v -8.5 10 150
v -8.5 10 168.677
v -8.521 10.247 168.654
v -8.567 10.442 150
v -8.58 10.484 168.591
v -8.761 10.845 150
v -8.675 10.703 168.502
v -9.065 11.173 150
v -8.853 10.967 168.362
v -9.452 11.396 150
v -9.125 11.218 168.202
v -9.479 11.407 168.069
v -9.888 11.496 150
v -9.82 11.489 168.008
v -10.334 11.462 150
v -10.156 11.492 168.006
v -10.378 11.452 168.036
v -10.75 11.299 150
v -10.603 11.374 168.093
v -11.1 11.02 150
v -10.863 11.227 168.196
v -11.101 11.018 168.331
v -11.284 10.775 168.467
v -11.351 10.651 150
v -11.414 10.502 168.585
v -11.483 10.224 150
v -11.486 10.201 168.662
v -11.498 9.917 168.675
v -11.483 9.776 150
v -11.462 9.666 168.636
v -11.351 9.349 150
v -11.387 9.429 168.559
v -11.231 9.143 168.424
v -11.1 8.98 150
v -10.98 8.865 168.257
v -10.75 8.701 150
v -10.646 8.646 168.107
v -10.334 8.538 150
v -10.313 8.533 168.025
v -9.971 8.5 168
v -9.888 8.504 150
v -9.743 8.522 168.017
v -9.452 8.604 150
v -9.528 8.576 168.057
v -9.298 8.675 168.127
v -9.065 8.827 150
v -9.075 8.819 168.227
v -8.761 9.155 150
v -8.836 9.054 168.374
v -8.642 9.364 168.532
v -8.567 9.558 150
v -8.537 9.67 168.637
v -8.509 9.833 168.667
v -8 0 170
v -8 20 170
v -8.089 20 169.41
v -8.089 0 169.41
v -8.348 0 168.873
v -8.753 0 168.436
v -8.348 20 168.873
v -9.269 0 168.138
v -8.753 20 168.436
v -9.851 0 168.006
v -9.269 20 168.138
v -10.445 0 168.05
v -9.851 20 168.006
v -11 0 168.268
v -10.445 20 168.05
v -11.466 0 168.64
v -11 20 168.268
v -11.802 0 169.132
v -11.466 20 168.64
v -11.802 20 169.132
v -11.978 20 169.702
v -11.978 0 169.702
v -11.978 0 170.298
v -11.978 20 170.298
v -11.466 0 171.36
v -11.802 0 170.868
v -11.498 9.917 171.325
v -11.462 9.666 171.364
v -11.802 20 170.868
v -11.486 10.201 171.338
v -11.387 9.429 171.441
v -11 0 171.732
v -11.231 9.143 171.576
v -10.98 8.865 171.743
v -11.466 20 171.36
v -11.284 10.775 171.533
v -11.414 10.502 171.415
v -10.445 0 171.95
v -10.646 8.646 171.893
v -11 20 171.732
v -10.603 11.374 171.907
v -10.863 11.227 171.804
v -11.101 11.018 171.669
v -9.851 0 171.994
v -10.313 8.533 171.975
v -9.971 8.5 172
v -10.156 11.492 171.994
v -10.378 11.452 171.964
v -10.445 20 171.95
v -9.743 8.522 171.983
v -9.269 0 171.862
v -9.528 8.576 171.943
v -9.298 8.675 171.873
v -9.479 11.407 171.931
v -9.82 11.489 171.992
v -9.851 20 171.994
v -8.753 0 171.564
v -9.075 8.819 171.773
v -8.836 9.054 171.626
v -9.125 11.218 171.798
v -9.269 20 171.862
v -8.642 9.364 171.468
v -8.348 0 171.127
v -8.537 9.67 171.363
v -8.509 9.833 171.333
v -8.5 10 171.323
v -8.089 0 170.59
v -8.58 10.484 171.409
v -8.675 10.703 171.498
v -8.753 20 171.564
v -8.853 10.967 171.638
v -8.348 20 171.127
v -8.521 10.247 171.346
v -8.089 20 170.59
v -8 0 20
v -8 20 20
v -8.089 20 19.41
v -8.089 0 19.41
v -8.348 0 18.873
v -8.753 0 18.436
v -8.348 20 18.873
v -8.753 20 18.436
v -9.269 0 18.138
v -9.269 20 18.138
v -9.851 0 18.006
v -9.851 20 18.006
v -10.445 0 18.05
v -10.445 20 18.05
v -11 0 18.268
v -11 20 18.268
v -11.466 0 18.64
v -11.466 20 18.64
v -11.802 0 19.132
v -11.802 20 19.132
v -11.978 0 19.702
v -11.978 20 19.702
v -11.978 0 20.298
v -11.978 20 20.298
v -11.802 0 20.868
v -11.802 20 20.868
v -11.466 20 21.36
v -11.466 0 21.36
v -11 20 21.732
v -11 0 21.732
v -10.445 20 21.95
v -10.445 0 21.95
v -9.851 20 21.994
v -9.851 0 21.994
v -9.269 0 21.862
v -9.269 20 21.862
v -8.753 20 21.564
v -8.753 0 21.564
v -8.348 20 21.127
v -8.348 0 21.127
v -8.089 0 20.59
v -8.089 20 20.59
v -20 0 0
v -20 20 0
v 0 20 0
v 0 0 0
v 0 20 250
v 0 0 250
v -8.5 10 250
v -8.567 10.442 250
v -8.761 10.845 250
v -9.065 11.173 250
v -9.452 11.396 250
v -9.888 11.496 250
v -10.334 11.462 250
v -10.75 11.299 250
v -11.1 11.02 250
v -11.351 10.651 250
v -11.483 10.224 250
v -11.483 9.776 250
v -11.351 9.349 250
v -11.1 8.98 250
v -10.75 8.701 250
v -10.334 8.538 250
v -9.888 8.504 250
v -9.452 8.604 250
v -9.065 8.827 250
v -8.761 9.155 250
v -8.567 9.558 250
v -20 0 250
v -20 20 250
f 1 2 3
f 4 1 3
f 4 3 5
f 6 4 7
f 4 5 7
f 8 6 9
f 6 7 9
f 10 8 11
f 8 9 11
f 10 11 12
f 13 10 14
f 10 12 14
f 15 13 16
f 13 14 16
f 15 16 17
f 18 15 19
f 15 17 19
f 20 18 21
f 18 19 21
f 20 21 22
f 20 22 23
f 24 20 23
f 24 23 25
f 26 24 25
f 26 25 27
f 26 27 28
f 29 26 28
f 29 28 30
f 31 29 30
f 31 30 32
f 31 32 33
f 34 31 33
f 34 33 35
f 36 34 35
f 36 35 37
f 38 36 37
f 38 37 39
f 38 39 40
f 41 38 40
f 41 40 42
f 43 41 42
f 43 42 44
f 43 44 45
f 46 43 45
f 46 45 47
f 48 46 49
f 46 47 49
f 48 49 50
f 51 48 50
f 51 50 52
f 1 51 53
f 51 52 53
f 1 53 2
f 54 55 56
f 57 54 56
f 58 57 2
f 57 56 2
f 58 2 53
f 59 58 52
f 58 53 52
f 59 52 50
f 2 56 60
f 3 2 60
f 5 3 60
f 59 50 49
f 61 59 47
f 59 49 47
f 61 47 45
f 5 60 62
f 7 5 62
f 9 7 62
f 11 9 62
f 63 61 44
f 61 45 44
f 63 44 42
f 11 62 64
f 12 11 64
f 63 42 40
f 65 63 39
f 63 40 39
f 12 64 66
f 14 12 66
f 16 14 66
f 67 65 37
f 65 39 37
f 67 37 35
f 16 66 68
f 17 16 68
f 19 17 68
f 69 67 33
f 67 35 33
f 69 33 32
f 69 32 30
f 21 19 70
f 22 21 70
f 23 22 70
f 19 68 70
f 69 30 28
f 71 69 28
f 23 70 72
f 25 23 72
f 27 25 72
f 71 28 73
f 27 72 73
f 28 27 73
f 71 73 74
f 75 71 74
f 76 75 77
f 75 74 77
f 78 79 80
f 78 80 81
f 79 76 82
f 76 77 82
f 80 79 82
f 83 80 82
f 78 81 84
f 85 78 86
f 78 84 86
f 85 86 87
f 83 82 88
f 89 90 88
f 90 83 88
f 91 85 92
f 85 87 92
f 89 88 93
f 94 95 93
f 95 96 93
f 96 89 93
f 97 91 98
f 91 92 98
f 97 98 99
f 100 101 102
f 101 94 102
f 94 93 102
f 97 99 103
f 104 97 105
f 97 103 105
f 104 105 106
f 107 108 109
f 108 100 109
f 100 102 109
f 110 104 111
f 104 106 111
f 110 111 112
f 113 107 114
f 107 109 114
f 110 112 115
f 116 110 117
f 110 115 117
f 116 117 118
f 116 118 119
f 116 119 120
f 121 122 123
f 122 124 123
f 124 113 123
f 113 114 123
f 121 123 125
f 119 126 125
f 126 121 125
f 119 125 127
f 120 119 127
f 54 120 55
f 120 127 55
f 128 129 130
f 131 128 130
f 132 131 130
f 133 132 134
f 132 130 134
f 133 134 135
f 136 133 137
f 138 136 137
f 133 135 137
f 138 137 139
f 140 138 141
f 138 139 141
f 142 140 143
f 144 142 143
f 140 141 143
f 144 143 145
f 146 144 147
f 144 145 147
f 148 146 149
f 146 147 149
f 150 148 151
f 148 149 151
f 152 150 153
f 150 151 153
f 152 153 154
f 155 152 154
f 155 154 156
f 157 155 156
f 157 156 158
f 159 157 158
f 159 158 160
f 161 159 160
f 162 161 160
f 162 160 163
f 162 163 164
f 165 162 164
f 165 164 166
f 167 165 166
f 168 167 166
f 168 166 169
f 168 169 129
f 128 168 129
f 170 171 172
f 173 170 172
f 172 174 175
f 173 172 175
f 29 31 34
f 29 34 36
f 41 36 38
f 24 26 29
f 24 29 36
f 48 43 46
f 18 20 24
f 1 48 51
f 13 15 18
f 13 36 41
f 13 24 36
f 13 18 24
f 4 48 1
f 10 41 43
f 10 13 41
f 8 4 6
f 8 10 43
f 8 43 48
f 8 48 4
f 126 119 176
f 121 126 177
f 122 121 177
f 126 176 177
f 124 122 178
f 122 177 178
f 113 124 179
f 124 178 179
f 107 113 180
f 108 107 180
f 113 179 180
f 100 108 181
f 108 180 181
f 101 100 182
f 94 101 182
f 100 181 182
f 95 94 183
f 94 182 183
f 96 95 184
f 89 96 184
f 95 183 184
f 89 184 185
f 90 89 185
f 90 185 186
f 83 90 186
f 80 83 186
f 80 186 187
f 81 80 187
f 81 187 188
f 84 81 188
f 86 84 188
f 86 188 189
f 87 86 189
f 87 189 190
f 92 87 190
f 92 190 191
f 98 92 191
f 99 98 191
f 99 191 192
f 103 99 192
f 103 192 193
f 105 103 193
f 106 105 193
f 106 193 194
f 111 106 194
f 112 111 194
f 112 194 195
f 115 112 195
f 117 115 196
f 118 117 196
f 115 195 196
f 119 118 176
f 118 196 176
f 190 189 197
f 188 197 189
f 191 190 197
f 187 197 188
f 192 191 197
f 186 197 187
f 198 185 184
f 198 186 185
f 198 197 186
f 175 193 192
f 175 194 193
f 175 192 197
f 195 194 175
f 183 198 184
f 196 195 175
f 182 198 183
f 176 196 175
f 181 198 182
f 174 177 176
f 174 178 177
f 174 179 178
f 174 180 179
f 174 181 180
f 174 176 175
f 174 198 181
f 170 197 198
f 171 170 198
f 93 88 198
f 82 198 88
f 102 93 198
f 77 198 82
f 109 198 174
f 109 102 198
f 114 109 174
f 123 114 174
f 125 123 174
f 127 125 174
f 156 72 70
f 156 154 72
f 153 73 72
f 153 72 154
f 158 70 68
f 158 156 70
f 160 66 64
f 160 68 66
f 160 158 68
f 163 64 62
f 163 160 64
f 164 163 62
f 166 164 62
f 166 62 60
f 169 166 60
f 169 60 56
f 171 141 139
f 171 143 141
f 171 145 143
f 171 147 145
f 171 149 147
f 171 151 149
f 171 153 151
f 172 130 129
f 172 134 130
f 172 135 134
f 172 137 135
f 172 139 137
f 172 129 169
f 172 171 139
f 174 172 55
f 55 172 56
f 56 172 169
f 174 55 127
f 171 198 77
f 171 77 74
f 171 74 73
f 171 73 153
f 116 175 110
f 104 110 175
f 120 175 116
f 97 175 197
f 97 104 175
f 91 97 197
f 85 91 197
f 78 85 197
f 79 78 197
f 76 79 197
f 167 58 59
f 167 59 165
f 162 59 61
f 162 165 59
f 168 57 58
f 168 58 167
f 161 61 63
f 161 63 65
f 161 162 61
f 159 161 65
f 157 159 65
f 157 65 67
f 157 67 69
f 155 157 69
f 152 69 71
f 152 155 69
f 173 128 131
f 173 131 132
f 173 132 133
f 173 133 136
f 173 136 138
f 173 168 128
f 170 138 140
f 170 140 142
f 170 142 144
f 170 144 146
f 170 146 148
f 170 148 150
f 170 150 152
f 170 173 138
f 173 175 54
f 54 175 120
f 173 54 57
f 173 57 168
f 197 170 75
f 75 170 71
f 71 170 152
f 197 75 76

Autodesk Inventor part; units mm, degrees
ref_plane "YZ Plane" through (0, 0, 0) normal (1, 0, 0) x (0, 1, 0)
ref_plane "XZ Plane" through (0, 0, 0) normal (0, 1, 0) x (-1, 0, 0)
ref_plane "XY Plane" through (0, 0, 0) normal (0, 0, 1) x (1, 0, 0)
sketch "Sketch1" plane through (0, 0, 0) normal (0, 0, 1) x (1, 0, 0)
  line L0 (0, 0) -> (-20, 0)
  line L1 (-20, 0) -> (-20, 20)
  line L2 (-20, 20) -> (0, 20)
  line L3 (0, 20) -> (0, 0)
  dimension "d0" = 20
  dimension "d1" = 20
extrude "Extrusion1" add sketch "Sketch1" along normal blind 250
sketch "Sketch2" plane through (0, 0, 250) normal (0, 0, 1) x (1, 0, 0)
  line L0 (0, 0) -> (-20, 20) construction
  circle A0 centre (-10, 10) radius 1.5
  dimension "d4" = 3
extrude "Extrusion2" cut sketch "Sketch2" against normal blind 100
sketch "Sketch3" plane through (-20, 20, 0) normal (0, 1, 0) x (1, 0, 0)
  line L0 (20, 0) -> (0, 0) projected
  line L1 (10, 0) -> (10, -250) construction
  circle A0 centre (10, -20) radius 2
  circle A1 centre (10, -170) radius 2
  dimension "d7" = 4
  dimension "d8" = 4
  dimension "d9" = 20
  dimension "d11" = 150
extrude "Extrusion3" cut sketch "Sketch3" against normal through all
properties part number "legno 1" material "Wood (Birch)"
